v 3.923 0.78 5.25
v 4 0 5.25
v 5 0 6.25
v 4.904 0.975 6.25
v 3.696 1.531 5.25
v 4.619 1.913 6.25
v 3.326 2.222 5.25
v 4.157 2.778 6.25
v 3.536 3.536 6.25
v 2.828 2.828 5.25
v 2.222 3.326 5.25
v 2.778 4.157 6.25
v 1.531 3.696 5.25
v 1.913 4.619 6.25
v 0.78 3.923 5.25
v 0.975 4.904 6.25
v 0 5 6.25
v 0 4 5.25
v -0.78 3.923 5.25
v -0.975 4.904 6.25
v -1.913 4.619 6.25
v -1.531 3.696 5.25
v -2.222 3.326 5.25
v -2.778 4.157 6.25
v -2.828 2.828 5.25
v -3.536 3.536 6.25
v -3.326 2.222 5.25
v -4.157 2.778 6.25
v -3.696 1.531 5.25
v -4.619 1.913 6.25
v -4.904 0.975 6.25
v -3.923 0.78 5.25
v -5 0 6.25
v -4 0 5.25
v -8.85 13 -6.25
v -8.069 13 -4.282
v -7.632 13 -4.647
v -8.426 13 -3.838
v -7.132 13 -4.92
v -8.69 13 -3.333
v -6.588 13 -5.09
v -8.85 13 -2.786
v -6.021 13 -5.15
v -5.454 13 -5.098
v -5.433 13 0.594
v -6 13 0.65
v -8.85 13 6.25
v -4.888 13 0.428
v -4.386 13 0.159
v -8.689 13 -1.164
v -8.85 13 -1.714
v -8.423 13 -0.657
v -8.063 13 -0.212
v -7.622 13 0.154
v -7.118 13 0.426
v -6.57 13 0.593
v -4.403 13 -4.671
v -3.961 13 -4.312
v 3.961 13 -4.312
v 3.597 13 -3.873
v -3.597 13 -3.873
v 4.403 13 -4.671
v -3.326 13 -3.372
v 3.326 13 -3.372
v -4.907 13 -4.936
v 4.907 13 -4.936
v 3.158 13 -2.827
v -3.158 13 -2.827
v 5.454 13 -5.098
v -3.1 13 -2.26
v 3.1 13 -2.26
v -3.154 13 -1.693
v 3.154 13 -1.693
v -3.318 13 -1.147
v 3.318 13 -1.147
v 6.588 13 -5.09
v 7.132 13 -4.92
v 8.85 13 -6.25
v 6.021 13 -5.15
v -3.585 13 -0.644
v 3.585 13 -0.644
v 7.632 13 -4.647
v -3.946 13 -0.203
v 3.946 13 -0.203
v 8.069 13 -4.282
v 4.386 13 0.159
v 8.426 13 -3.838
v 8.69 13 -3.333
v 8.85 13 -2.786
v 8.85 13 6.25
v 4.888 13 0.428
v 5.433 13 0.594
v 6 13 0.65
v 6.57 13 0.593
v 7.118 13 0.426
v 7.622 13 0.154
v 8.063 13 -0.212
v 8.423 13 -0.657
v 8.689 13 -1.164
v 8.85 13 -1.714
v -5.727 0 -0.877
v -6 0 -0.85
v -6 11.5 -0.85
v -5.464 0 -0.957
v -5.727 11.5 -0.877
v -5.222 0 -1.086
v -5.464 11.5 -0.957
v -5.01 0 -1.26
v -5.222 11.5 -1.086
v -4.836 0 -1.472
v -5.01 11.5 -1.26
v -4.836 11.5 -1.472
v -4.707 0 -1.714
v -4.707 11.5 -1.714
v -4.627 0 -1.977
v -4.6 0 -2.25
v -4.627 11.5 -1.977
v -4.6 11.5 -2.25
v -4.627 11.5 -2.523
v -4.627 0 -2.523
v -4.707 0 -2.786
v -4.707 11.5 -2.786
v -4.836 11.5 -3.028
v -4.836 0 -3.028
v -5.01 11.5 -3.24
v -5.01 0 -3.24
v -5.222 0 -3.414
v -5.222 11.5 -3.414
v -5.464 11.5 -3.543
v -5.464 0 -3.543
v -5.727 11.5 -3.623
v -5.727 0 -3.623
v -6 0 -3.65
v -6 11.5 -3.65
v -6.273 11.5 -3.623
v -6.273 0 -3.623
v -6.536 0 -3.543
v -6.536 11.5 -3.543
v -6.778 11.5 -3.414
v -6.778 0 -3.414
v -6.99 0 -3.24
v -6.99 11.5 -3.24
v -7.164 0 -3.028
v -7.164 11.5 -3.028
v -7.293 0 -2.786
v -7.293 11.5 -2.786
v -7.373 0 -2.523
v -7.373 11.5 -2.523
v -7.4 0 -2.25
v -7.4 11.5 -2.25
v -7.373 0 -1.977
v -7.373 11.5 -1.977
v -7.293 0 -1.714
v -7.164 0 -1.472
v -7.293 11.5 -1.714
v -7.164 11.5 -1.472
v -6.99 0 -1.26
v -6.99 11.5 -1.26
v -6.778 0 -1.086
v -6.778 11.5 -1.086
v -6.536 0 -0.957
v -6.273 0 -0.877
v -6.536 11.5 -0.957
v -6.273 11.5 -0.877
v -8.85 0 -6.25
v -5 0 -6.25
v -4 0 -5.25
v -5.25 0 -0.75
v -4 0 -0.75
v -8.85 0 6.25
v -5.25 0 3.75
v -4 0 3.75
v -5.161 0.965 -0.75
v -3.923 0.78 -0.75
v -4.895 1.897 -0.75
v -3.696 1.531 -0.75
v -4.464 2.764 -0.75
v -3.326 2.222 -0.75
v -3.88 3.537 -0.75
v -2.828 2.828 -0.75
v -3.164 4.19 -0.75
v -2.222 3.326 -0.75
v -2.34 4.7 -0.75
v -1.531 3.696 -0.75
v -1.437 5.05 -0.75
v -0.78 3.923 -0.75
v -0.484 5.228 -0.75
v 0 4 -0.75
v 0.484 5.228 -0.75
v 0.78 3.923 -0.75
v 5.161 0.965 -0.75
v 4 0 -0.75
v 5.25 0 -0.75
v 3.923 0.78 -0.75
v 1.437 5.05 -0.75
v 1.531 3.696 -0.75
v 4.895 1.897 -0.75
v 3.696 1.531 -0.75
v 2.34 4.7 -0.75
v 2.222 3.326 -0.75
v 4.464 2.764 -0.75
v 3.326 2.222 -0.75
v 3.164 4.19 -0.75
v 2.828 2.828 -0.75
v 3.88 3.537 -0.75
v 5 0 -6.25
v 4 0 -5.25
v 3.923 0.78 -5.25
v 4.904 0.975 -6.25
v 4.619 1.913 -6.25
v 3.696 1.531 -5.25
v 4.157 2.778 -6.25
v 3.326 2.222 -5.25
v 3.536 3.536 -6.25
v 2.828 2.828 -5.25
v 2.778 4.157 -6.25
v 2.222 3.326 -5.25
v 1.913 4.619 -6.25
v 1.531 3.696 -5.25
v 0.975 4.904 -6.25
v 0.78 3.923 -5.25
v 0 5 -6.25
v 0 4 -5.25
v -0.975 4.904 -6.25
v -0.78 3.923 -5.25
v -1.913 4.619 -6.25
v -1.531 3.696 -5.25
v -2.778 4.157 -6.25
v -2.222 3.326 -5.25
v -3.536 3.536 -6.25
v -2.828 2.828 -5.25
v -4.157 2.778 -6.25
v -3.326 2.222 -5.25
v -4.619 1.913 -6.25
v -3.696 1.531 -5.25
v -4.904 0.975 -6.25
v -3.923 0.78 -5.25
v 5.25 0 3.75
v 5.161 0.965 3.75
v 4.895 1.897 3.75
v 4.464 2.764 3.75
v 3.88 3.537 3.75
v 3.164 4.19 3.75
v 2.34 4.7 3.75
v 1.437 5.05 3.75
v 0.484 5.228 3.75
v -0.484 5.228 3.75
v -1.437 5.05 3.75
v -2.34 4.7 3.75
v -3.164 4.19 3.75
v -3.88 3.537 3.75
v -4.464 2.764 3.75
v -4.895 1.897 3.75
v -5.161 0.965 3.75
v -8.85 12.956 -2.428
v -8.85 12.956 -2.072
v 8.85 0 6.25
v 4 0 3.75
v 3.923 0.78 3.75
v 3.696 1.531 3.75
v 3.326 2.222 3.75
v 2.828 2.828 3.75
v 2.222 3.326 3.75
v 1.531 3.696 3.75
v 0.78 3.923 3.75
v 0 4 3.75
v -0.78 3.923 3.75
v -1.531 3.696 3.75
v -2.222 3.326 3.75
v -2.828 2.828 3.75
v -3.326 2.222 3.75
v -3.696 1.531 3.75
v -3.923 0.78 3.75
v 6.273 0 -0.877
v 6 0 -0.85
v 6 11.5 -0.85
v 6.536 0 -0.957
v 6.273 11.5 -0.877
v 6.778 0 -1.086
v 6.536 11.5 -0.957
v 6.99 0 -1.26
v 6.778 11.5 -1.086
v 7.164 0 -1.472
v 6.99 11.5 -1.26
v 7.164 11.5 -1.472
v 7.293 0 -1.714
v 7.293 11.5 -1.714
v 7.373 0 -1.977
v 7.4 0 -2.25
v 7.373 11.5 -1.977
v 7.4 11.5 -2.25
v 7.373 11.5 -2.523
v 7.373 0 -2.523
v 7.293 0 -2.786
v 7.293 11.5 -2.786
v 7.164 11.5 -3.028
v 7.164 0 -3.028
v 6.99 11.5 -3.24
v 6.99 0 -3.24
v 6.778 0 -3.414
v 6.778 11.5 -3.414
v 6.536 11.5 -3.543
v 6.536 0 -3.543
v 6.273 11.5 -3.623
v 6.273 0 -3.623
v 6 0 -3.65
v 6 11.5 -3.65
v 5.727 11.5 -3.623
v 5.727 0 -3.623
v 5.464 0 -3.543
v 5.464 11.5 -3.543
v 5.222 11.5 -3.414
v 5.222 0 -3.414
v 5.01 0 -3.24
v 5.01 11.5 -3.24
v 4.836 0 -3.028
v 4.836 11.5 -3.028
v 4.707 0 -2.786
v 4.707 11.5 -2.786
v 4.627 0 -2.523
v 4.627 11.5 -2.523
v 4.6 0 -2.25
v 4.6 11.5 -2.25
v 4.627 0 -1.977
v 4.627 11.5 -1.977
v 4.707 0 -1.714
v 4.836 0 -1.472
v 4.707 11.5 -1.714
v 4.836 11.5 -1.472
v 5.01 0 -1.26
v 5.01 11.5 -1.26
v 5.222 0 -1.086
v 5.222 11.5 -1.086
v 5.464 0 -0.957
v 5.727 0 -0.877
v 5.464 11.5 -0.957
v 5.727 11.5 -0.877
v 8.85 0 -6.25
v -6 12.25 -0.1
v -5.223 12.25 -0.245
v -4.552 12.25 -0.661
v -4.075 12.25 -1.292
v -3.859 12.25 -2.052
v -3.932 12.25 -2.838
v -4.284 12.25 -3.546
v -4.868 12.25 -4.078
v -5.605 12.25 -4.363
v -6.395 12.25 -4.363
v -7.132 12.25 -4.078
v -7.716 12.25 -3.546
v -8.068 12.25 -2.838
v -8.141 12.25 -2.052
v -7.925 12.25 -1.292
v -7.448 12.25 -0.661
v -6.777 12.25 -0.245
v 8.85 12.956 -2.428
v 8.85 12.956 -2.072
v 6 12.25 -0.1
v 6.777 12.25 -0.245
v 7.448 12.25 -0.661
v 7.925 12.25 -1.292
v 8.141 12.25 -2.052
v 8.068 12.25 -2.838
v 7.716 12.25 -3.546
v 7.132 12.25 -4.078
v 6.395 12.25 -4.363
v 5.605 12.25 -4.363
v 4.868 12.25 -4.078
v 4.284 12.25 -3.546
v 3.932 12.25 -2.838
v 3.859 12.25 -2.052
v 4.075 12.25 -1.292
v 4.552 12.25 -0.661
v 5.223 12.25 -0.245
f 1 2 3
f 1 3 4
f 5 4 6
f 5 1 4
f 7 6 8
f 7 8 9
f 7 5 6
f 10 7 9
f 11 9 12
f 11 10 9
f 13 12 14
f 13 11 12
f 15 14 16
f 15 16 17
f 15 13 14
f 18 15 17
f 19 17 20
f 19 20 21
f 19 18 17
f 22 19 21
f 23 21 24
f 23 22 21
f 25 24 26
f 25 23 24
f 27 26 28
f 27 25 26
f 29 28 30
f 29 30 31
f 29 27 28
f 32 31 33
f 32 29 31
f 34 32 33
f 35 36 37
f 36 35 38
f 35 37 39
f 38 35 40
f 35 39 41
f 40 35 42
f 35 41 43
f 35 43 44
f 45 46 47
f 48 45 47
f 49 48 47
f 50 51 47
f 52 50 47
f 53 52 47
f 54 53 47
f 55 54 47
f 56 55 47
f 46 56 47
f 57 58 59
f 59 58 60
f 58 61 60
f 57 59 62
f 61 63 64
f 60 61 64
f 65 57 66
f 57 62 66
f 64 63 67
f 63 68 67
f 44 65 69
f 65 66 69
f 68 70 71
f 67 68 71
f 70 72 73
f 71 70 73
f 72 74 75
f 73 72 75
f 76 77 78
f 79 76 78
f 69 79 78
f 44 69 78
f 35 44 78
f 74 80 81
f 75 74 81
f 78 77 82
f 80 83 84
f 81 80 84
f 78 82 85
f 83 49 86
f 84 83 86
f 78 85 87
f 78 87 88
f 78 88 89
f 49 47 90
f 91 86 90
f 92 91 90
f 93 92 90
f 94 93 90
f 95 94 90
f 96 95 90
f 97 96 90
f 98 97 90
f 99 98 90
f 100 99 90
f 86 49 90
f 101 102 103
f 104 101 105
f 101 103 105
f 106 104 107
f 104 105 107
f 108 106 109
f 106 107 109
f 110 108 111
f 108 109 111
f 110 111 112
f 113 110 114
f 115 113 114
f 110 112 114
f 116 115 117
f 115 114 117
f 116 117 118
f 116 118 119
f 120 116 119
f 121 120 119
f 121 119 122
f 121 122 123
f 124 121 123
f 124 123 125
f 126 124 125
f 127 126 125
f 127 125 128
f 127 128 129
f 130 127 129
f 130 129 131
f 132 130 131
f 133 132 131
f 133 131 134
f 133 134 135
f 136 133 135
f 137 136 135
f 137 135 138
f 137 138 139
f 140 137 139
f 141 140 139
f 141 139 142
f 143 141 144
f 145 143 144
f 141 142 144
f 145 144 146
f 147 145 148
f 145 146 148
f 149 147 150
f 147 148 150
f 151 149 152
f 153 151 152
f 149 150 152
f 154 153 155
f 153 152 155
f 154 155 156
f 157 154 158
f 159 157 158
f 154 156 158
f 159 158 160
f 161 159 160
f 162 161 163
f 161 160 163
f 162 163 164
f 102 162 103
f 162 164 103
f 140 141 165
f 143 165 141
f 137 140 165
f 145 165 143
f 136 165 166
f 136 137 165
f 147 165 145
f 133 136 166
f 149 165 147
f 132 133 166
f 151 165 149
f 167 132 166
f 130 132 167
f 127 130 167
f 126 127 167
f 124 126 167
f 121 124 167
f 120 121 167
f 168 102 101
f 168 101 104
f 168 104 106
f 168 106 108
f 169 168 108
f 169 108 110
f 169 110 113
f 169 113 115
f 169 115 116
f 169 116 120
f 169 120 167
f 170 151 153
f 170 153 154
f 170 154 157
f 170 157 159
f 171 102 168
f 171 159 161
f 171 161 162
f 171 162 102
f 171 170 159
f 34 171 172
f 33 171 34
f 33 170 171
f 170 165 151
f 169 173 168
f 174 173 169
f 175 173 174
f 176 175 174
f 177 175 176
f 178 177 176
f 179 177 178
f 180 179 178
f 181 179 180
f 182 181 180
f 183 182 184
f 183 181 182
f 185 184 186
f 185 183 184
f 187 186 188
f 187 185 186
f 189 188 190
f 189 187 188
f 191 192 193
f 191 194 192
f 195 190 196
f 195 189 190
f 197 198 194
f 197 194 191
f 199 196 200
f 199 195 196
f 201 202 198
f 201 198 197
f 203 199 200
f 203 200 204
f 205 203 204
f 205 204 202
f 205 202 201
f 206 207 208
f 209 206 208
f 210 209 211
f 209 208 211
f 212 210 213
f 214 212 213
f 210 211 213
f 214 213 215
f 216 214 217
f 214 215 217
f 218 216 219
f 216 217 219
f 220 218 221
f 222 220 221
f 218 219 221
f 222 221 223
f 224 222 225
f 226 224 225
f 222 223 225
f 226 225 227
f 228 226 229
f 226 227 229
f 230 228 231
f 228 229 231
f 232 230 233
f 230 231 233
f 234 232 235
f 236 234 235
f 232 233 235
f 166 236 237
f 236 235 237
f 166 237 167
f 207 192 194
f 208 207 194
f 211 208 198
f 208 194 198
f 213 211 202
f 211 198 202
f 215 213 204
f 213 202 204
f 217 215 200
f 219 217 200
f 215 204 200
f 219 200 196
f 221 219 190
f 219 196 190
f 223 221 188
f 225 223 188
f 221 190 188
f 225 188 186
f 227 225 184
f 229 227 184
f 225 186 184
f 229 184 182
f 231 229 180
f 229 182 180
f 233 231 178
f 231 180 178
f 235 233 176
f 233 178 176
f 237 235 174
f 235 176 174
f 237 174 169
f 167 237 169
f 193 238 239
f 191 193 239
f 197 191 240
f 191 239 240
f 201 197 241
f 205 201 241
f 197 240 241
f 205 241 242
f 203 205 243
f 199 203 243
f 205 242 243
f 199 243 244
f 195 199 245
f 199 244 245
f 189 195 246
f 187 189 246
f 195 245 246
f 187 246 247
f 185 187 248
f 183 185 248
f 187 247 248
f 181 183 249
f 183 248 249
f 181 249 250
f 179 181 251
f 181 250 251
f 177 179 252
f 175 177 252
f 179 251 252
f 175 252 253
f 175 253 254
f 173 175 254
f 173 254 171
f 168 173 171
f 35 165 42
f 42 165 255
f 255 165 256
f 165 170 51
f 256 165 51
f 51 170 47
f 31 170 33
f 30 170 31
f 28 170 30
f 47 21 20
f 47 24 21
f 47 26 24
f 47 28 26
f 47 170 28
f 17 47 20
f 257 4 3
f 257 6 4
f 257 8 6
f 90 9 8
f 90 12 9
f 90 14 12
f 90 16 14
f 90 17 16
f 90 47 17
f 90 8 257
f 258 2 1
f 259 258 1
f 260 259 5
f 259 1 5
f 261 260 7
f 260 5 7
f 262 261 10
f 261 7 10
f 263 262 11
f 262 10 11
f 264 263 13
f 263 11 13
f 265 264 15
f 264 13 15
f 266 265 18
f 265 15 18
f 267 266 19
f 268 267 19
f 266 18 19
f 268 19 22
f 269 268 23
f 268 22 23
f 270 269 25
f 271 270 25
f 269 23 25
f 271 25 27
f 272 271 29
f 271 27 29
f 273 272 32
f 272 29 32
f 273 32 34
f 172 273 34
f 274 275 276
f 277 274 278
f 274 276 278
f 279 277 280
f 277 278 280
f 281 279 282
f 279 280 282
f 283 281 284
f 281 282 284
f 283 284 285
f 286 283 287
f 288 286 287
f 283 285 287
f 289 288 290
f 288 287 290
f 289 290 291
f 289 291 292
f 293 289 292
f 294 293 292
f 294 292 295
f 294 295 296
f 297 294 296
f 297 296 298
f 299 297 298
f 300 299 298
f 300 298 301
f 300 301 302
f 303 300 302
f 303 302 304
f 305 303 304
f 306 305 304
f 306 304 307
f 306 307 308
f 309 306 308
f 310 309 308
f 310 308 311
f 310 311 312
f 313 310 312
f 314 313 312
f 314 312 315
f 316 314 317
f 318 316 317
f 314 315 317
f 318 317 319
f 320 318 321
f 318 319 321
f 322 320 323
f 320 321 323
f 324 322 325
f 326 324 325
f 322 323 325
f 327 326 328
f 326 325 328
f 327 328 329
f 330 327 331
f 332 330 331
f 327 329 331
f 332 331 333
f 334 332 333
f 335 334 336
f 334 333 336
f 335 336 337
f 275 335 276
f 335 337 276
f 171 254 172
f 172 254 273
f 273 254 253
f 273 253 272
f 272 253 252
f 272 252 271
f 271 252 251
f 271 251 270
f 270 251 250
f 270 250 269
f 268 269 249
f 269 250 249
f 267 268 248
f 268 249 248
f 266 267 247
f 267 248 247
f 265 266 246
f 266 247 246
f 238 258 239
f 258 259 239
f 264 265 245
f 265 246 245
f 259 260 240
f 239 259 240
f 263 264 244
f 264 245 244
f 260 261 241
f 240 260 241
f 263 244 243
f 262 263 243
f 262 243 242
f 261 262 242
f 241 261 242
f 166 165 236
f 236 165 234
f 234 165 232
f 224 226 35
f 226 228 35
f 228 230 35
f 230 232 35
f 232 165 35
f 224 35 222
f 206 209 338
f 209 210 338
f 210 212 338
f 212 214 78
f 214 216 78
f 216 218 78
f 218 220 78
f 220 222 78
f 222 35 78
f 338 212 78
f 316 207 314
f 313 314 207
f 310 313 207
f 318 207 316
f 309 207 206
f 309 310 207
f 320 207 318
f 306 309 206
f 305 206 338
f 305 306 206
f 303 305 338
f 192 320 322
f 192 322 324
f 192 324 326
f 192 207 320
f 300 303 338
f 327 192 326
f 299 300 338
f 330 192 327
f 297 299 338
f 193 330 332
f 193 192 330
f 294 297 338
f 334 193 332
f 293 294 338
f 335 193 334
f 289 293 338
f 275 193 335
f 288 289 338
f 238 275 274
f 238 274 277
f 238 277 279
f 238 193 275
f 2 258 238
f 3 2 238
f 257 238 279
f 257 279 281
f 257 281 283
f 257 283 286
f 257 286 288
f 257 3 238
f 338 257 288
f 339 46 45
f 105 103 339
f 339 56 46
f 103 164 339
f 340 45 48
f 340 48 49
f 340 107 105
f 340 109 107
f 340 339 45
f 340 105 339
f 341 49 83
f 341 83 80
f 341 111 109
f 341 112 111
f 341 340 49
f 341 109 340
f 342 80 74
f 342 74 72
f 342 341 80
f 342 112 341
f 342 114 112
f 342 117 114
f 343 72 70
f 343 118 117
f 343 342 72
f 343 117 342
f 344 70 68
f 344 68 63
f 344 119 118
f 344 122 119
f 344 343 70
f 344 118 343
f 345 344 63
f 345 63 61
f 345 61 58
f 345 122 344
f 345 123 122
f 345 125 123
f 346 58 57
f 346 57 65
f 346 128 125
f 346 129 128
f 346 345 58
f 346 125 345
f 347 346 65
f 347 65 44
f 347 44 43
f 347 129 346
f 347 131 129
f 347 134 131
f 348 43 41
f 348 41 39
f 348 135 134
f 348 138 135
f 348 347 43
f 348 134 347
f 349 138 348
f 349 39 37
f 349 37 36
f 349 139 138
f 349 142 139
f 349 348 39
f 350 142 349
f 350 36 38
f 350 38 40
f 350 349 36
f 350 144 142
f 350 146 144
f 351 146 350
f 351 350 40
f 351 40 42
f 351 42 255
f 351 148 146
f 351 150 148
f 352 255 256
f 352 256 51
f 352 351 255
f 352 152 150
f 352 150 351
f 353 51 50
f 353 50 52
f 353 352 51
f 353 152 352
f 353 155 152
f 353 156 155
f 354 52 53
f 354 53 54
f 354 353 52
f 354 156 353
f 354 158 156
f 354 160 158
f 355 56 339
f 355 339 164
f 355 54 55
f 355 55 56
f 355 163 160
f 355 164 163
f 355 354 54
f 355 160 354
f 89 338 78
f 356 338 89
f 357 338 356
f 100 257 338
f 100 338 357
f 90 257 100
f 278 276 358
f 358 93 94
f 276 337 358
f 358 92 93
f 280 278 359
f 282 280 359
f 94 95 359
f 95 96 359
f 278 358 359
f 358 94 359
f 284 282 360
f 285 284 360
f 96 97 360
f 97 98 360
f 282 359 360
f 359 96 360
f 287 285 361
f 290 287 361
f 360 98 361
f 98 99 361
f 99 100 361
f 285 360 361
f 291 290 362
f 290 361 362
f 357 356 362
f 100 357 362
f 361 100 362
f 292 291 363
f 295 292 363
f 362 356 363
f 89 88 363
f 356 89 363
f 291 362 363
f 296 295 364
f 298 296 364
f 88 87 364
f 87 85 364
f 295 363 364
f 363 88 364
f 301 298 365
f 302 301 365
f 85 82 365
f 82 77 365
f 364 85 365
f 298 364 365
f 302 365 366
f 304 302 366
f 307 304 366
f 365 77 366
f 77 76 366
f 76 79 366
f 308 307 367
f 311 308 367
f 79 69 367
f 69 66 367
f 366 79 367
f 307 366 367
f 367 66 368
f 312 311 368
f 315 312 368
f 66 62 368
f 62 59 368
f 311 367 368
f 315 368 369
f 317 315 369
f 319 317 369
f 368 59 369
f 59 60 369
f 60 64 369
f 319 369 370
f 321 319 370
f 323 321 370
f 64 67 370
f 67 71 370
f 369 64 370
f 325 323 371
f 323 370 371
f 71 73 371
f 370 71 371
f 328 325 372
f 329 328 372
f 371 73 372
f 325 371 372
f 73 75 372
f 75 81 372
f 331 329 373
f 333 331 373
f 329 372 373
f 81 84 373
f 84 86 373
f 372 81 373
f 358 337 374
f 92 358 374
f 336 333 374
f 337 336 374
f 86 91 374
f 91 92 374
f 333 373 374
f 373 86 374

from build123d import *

# Parameters (mm, degrees)
SKETCH_2_W            = 17.7
SKETCH_2_H            = 13
EXTRUDE_380_DEPTH     = 6.25
SKETCH_3_R            = 4
CUT_EXTRUDE_527_DEPTH = 21.089113968
CUT_EXTRUDE_START     = -2.5
SKETCH_4_R            = 5.25
CUT_EXTRUDE_676_DEPTH = 4.5
SKETCH_5_R            = 1.4
CUT_EXTRUDE_872_DEPTH = 17.922913461
CHAMFER_2_SIZE        = 1
CHAMFER_3_SIZE        = 1.5


with BuildPart() as part:
    # Эскиз2 → Extrude 380 (new, symmetric)
    with BuildSketch(Plane.XY):
        with Locations((0, 6.5)):
            Rectangle(SKETCH_2_W, SKETCH_2_H)
    extrude(amount=EXTRUDE_380_DEPTH, both=True)

    # Эскиз3 → Cut-Extrude 527 (cut, through all)
    with BuildSketch(Plane.XY.offset(6.25)):
        Circle(SKETCH_3_R)
    extrude(amount=-CUT_EXTRUDE_527_DEPTH, mode=Mode.SUBTRACT)

    # Эскиз4 → Cut-Extrude 676 (cut)
    with BuildSketch(Plane.XY.offset(6.25).offset(CUT_EXTRUDE_START)):
        Circle(SKETCH_4_R)
    extrude(amount=-CUT_EXTRUDE_676_DEPTH, mode=Mode.SUBTRACT)

    # Эскиз5 → Cut-Extrude 872 (cut, through all)
    with BuildSketch(Plane(origin=(0, 13, 0), x_dir=(1, 0, 0), z_dir=(0, 1, 0))):
        with Locations(Location((-6, 2.25, 0), (0, 0, 270))):
            Circle(SKETCH_5_R)
        with Locations(Location((6, 2.25, 0), (0, 0, 270))):
            Circle(SKETCH_5_R)
    extrude(amount=-CUT_EXTRUDE_872_DEPTH, mode=Mode.SUBTRACT)

    # Фаска2
    chamfer_2_edges = [part.edges().sort_by_distance(p)[0] for p in [
        (0, 4, 6.25),
        (0, 4, -6.25),
    ]]
    chamfer(chamfer_2_edges, length=CHAMFER_2_SIZE)

    # Фаска3
    # the kernel refuses this chamfer: 1.5 mm, written as the material it takes off along each edge
    with BuildSketch(Plane(origin=(-6, 13, -2.25), x_dir=(0, 0, 1), z_dir=(-1, 0, 0))) as chamfer_3_piece_1:
        Polygon((1.4 + CHAMFER_3_SIZE, 0), (1.4, -CHAMFER_3_SIZE), (1.4, 0), align=None)
    revolve(axis=Axis((-6, 13, -2.25), (0, 1, 0)), mode=Mode.SUBTRACT)
    with BuildSketch(Plane(origin=(6, 13, -2.25), x_dir=(0, 0, 1), z_dir=(-1, 0, 0))) as chamfer_3_piece_2:
        Polygon((1.4, -CHAMFER_3_SIZE), (1.4 + CHAMFER_3_SIZE, 0), (1.4, 0), align=None)
    revolve(axis=Axis((6, 13, -2.25), (0, 1, 0)), mode=Mode.SUBTRACT)


solid = part.part
